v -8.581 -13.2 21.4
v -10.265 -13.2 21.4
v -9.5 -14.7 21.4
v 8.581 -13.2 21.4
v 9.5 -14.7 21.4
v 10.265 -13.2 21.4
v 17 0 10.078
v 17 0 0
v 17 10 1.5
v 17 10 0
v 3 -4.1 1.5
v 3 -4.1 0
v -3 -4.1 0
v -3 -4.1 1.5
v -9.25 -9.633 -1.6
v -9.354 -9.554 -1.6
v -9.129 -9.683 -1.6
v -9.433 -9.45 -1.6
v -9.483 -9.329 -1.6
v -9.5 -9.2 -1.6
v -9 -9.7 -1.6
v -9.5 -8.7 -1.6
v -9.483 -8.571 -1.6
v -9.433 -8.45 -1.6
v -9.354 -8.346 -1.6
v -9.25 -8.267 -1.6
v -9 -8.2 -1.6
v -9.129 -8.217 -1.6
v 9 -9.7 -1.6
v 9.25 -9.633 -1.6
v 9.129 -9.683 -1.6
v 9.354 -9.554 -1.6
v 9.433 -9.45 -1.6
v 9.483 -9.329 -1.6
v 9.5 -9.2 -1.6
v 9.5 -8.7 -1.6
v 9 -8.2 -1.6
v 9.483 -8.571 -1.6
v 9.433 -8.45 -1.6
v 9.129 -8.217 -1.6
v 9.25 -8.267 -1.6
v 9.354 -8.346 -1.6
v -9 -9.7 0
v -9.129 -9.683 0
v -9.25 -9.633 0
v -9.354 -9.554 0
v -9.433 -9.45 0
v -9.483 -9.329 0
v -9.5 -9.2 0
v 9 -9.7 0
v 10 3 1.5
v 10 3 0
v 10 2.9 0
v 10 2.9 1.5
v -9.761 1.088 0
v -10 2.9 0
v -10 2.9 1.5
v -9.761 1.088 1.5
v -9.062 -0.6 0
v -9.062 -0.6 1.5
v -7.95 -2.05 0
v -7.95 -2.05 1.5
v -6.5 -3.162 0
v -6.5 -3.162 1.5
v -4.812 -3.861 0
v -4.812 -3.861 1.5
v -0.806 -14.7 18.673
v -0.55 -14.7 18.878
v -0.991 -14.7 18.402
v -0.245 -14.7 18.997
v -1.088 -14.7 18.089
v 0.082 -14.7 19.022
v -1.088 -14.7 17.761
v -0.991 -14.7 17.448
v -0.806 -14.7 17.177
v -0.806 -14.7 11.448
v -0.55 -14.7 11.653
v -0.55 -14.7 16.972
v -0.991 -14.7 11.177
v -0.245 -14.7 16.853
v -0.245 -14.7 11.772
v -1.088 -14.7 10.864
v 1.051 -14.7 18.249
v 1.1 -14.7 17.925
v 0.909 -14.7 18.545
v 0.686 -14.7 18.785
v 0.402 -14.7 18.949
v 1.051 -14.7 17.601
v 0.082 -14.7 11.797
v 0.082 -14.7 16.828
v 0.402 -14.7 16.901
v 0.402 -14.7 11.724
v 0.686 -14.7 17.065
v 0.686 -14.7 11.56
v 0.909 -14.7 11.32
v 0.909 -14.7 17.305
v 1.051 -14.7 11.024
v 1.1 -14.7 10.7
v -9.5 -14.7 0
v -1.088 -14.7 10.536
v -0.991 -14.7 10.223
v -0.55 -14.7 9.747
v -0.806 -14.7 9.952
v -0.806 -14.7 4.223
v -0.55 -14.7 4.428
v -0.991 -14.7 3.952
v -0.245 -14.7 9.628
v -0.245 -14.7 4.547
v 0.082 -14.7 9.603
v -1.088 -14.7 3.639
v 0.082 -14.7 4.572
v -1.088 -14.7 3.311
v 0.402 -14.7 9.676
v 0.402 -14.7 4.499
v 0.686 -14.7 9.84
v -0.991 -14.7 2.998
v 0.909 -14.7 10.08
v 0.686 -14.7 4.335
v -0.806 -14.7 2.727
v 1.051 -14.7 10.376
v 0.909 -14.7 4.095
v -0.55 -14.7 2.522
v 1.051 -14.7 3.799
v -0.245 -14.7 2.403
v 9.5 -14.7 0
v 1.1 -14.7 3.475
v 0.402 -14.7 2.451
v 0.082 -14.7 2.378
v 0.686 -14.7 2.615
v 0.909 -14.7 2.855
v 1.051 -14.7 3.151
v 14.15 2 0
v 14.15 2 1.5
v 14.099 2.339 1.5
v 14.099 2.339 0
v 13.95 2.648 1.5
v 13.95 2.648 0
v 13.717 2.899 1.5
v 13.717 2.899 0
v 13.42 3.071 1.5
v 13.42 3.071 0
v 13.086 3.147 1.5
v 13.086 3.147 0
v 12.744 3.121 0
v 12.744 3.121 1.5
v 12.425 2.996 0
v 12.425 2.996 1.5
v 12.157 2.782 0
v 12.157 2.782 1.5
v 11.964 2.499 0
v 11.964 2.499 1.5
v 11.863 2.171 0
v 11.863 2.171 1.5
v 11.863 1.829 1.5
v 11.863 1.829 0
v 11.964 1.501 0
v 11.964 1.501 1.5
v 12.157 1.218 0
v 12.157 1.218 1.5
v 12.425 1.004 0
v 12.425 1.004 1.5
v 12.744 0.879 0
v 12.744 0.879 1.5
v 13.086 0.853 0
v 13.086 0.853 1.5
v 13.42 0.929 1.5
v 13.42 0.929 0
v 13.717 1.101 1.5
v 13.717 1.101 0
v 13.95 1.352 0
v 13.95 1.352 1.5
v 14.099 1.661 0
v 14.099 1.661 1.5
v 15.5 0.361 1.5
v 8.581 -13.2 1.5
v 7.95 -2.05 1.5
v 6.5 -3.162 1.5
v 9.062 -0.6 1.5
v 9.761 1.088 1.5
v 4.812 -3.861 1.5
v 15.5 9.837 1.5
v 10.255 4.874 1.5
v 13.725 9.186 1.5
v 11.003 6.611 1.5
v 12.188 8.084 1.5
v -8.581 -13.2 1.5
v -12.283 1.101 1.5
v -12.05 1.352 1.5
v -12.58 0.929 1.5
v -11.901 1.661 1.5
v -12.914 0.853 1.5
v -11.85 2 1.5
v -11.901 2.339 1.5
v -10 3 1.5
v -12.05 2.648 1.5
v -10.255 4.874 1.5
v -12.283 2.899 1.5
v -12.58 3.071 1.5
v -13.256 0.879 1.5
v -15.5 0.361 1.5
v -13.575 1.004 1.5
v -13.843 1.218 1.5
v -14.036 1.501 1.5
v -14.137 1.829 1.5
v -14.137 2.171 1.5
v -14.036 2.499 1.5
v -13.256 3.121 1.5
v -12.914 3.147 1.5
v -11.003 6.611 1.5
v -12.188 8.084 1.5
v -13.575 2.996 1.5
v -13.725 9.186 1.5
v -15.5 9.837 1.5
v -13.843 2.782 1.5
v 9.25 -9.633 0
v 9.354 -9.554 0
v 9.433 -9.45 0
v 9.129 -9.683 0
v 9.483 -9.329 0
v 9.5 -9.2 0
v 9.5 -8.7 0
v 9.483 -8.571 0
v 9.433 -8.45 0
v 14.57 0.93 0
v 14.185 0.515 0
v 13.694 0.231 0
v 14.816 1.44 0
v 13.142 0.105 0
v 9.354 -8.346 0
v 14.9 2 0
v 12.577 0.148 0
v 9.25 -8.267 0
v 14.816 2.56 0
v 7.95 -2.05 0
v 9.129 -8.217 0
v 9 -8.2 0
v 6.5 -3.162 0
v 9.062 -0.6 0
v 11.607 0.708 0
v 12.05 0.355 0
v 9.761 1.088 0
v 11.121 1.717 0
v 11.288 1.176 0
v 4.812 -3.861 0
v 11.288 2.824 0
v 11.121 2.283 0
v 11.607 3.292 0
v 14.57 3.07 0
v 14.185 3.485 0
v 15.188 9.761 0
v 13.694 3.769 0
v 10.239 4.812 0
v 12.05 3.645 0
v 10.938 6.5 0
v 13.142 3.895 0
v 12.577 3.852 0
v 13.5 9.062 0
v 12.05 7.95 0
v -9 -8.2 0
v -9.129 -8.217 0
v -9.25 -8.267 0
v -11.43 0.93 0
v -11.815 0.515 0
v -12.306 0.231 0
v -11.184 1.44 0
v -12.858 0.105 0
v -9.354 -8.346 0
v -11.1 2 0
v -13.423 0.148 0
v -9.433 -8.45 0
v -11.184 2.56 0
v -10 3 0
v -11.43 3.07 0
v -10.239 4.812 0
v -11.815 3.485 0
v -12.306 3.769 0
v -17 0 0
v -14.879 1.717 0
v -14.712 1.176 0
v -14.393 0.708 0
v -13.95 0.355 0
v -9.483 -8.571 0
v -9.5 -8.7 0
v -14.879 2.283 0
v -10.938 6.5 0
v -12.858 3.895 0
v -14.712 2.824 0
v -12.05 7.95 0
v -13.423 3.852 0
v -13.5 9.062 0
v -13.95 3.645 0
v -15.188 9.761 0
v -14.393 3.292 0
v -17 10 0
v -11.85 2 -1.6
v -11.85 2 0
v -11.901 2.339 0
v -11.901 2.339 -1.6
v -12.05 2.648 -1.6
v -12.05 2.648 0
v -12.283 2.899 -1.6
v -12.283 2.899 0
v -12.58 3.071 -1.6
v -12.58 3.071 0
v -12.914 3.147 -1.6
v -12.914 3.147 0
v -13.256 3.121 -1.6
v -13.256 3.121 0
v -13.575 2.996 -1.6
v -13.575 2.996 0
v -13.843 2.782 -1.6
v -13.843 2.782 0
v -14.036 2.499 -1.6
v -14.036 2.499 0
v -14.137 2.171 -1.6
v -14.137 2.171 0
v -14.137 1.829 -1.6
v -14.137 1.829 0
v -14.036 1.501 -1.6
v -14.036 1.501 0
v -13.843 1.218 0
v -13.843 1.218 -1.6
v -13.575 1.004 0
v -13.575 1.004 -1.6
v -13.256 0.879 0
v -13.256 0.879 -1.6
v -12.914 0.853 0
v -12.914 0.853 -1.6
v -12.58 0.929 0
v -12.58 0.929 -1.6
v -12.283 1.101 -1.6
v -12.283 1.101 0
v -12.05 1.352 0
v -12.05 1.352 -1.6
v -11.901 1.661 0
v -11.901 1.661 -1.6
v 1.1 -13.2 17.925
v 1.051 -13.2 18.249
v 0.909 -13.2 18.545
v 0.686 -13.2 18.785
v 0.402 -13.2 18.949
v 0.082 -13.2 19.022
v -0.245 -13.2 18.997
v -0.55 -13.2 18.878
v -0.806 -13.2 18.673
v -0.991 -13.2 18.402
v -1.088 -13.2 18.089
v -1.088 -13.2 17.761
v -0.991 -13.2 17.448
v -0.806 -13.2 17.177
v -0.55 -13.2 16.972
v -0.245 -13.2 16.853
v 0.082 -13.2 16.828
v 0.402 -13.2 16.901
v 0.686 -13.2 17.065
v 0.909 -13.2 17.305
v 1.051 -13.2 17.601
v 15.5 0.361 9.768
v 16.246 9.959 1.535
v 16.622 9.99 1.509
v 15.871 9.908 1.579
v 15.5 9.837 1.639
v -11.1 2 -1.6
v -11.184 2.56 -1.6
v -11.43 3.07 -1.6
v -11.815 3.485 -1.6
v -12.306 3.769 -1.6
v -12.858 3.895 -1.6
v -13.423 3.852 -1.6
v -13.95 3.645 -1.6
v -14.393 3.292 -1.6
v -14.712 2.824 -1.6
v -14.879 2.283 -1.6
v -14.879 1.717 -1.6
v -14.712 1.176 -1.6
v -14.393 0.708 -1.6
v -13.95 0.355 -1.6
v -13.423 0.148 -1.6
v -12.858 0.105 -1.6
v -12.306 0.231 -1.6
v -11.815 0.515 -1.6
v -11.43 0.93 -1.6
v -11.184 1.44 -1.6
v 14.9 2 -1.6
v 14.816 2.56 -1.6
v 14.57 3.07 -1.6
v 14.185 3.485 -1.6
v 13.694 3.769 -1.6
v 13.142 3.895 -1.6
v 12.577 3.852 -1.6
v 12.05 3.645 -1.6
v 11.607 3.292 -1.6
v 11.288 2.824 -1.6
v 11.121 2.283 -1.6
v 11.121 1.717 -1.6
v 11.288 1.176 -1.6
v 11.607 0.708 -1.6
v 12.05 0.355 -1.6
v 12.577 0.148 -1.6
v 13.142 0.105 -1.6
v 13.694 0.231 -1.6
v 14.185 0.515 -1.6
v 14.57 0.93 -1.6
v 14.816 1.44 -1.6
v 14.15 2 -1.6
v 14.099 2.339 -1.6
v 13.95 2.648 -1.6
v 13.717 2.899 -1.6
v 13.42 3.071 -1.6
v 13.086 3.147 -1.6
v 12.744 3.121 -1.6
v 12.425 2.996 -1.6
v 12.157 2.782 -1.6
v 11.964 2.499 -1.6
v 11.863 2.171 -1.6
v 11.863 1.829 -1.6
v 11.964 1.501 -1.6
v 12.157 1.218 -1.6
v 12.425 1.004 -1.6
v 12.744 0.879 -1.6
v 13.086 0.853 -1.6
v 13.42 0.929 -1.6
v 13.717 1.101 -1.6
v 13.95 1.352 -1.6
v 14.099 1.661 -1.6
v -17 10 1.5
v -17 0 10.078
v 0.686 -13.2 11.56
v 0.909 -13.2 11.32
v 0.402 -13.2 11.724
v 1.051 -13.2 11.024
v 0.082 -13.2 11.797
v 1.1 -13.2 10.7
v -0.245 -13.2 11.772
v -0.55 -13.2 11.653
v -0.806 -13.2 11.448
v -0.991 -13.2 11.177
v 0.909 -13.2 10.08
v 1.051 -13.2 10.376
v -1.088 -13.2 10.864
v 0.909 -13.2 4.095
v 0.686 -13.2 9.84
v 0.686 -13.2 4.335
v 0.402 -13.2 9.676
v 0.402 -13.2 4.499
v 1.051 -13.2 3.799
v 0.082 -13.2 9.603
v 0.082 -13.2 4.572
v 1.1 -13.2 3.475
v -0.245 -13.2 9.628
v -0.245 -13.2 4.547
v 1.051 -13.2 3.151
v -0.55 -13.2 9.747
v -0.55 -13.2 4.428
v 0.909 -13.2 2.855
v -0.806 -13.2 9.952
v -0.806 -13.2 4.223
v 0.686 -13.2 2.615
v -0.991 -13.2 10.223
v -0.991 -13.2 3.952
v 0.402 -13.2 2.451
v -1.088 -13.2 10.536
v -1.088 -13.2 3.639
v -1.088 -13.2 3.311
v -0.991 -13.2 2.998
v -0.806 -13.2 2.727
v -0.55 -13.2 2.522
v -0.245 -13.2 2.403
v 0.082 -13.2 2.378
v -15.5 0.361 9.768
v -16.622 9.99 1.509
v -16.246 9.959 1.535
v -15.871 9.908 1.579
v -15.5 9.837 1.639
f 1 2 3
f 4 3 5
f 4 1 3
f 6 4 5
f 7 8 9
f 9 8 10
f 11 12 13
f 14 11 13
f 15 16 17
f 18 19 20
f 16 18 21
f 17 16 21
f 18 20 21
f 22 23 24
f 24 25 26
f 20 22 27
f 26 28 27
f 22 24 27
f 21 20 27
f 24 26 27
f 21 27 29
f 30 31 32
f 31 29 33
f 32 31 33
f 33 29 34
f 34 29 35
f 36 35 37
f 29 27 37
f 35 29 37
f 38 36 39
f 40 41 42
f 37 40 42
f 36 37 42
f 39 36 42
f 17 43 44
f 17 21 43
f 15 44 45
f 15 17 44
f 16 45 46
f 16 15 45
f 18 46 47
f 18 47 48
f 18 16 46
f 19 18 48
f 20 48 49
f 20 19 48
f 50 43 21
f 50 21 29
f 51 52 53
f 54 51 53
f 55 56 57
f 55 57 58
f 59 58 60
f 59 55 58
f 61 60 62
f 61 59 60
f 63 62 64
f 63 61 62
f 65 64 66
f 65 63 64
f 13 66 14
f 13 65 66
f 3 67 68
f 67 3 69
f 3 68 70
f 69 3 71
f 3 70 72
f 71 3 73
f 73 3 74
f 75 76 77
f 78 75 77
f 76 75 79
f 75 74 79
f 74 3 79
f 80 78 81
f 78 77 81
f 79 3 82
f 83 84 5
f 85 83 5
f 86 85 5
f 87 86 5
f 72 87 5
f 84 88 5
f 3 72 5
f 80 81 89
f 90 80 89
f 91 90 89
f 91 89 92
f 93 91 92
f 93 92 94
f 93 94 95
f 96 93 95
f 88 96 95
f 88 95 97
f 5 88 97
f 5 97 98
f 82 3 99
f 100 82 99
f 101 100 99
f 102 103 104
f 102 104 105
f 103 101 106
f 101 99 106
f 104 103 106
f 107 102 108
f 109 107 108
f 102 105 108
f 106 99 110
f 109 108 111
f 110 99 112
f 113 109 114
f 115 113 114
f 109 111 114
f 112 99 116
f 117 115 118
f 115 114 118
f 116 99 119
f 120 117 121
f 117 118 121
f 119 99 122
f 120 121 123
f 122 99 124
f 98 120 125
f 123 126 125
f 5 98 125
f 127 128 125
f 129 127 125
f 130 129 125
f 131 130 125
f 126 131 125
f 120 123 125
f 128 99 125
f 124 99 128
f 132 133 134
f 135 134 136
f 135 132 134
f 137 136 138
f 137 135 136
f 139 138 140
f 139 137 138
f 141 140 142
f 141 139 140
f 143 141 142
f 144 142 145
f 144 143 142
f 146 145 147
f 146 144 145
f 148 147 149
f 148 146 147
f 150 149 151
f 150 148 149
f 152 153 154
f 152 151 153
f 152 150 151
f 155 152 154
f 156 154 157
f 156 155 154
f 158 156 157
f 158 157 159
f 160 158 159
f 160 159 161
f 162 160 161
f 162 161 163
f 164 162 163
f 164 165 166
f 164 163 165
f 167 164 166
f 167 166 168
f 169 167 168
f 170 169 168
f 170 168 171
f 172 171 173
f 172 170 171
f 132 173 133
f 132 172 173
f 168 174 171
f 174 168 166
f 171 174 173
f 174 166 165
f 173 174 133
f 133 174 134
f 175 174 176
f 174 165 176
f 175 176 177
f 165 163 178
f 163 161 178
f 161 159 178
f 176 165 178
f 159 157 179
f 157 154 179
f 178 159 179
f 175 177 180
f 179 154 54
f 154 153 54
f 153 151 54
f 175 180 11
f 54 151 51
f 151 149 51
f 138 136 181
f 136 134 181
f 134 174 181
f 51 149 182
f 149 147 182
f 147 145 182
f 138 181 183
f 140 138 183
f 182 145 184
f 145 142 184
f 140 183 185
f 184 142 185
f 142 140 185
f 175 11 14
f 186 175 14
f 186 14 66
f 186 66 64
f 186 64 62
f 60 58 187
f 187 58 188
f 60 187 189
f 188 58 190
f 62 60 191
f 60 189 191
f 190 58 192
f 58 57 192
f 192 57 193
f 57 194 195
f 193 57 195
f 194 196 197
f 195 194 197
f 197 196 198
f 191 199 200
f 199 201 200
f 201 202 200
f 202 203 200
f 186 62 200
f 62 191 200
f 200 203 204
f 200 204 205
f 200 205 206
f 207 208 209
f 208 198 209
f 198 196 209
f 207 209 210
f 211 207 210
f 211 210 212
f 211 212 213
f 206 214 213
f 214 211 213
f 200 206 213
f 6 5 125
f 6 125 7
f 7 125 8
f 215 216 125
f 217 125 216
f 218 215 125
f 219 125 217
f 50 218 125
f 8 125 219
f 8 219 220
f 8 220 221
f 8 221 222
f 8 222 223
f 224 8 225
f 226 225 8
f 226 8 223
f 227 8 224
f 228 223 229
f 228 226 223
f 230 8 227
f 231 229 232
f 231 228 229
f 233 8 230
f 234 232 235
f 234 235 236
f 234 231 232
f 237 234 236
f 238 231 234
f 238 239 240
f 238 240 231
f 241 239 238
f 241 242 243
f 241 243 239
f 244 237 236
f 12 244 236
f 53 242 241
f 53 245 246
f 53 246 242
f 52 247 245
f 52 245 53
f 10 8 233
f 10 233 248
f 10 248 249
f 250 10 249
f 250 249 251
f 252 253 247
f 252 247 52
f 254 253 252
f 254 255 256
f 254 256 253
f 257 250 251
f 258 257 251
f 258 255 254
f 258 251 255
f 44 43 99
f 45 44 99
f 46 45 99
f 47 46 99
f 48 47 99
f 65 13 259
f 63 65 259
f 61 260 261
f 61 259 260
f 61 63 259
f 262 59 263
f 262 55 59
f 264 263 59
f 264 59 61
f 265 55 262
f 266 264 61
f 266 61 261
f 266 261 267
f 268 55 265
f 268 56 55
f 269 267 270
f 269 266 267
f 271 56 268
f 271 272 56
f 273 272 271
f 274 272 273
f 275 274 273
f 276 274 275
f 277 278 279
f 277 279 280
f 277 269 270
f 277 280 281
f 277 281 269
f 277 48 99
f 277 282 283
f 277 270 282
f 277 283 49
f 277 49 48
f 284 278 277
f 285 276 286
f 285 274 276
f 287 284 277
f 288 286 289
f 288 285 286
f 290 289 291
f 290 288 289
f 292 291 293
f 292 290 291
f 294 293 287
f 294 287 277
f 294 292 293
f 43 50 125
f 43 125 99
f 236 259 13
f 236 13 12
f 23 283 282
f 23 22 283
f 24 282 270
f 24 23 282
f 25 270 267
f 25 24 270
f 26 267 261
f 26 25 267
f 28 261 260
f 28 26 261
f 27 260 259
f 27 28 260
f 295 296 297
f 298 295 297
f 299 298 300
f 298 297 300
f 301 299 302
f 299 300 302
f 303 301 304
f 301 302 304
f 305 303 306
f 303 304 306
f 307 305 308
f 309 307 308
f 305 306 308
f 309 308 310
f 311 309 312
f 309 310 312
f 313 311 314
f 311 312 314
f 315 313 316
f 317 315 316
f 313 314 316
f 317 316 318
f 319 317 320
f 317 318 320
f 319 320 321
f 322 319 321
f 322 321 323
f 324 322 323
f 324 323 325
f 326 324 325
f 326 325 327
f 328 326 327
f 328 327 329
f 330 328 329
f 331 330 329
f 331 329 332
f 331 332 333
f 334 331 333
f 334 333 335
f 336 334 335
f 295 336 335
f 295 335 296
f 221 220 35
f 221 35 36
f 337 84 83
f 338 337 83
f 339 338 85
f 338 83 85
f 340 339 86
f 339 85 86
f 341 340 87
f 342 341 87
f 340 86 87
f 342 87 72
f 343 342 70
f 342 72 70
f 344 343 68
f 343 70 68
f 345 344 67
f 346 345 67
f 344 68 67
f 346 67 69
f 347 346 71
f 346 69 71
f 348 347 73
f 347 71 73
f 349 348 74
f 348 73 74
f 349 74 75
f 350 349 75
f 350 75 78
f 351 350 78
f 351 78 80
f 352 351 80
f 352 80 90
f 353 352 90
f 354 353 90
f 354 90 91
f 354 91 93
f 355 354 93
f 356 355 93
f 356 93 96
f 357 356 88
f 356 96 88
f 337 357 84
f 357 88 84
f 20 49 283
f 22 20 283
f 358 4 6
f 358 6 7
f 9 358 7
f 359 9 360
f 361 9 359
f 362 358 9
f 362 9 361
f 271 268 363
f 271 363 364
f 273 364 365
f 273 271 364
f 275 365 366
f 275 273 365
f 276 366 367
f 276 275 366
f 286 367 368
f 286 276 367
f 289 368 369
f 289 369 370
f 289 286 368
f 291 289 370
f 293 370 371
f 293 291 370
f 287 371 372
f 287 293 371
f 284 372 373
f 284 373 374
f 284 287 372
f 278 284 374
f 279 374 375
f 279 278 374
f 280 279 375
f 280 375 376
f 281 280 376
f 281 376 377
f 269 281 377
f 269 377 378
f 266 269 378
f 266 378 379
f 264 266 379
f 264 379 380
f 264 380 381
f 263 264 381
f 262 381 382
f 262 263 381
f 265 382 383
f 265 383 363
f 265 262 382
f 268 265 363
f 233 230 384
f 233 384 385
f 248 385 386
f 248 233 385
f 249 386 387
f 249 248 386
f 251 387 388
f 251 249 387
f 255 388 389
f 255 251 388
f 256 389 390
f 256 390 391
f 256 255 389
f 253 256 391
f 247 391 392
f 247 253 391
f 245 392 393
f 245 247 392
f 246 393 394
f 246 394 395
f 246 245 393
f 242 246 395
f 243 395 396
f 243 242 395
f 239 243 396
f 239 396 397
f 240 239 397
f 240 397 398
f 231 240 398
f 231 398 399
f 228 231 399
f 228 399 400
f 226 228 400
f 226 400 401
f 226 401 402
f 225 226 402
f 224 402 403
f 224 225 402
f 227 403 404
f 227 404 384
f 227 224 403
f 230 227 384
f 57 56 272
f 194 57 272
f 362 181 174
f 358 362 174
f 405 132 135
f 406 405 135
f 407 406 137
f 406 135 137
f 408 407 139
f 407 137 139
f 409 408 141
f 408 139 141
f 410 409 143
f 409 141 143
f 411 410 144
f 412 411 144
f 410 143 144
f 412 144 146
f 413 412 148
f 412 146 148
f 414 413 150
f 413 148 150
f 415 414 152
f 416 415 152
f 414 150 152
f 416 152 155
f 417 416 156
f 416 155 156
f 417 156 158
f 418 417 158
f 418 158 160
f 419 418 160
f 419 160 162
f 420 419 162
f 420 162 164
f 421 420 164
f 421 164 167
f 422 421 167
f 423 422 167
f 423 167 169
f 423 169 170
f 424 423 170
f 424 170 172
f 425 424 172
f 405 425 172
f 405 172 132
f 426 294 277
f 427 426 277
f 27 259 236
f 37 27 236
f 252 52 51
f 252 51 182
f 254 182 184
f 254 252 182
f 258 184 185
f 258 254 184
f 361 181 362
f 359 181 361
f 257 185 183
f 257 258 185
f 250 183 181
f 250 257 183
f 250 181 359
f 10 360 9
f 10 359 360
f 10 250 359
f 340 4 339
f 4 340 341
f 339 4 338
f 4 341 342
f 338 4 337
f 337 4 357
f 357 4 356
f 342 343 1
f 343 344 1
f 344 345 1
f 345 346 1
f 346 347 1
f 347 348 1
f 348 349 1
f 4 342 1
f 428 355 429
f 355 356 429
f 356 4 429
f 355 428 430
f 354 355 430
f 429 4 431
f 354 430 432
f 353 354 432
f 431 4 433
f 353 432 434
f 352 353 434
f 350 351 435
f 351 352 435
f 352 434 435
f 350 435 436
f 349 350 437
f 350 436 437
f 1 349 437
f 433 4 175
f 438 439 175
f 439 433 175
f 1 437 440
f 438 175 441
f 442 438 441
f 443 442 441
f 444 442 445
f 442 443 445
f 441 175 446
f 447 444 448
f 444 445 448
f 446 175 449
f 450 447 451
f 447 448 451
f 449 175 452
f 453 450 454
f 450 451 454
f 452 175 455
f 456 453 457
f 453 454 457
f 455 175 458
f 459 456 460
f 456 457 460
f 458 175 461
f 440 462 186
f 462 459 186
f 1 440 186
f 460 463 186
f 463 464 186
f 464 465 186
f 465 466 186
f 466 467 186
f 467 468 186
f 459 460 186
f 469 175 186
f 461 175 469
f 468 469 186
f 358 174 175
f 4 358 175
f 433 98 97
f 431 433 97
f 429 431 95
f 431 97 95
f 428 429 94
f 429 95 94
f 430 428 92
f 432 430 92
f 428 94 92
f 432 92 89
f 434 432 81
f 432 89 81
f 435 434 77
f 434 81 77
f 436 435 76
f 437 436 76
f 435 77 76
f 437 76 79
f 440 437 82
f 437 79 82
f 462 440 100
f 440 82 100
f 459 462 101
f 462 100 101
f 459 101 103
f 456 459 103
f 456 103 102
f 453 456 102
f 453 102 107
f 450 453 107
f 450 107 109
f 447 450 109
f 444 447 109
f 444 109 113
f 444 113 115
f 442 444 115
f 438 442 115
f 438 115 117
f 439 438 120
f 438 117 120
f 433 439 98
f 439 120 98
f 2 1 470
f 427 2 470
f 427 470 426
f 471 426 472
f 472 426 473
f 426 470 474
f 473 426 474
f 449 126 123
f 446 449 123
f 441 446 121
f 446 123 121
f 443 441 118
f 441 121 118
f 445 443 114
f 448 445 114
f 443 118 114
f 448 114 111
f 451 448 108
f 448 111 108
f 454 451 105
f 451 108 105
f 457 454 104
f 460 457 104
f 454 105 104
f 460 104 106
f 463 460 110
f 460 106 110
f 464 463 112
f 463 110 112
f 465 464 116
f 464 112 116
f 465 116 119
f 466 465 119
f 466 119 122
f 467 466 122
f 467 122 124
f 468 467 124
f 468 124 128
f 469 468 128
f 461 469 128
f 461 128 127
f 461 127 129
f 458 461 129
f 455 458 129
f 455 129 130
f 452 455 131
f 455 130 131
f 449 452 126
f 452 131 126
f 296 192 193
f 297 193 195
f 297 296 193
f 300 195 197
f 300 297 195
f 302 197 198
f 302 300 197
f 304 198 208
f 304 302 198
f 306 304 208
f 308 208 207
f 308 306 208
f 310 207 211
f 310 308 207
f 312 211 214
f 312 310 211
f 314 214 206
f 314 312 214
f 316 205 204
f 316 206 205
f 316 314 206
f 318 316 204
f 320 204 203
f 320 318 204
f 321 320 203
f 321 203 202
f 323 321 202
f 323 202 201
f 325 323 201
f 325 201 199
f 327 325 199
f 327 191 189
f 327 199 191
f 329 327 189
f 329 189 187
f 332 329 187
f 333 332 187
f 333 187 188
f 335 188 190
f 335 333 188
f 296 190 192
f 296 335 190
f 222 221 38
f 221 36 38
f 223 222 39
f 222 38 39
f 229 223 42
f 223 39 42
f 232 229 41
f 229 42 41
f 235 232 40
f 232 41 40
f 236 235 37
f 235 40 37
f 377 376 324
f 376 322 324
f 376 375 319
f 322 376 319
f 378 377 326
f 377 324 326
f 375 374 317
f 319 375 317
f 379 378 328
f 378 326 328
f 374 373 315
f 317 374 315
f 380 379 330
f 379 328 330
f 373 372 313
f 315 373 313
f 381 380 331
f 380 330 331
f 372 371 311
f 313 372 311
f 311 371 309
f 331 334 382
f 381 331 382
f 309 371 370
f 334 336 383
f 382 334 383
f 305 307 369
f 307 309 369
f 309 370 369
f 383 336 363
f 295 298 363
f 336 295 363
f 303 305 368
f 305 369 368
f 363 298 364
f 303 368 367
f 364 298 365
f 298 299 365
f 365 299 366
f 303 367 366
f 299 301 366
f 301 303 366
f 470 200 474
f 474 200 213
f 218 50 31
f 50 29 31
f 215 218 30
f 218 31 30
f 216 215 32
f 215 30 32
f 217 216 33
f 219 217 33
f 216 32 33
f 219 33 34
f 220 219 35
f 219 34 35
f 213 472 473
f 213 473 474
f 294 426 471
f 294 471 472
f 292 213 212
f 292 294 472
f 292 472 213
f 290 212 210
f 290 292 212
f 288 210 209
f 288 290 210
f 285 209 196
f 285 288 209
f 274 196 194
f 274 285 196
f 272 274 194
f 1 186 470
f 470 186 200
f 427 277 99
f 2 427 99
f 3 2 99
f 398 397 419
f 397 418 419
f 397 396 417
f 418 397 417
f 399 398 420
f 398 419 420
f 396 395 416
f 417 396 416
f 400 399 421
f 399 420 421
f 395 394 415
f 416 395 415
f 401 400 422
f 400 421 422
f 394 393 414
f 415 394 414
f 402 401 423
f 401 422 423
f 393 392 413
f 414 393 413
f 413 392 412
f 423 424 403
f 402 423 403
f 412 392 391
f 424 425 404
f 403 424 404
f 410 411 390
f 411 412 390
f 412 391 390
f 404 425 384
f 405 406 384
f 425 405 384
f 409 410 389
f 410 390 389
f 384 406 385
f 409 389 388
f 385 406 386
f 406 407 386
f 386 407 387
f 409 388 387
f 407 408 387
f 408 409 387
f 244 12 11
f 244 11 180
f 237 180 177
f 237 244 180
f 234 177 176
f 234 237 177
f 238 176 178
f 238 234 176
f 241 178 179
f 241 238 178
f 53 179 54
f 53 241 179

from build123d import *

# Parameters (mm, degrees)
F4_DEPTH       = 21.4
F5_DEPTH       = 1.5
F1_R           = 1.9
F1_W           = 19
F1_H           = 1.5
F6_DEPTH       = 1.6
F8_DEPTH       = 17.001
F8_DEPTH_BACK  = 17.001
F9_R           = 1.15
F10_DEPTH      = 21.401
F10_DEPTH_BACK = 1.601
F11_R          = 1.1
F12_DEPTH      = 1.5
F13_T1_DEPTH   = 1.5
F13_T3_DEPTH   = 36.5
F14_R          = 0.5


# Not quite as in the source:
# - a fillet or chamfer that OpenCascade refuses, or shapes differently, is made with other operations: its cross-section is extruded or revolved along the edge and cut away or added


with BuildPart() as f4:
    # F3 (on face) → F4 (new body)
    with BuildSketch(Plane.XY):
        Polygon((-15.5, 10), (-17, 10), (-17, 0), (-9.5, -14.7), (0, -14.7), (9.5, -14.7), (17, 0), (17, 10), (15.5, 10), (15.5, 0.3605454095), (8.5813543829, -13.2), (0, -13.2), (-8.5813543829, -13.2), (-15.5, 0.3605454095), align=None)
    extrude(amount=F4_DEPTH)

    # F2 (on Top) → F5 (join)
    with BuildSketch(Plane.XY):
        Polygon((-17, 0), (-9.5, -14.7), (0, -14.7), (9.5, -14.7), (17, 0), (17, 10), (10, 10), (10, -4.1), (0, -4.1), (-10, -4.1), (-10, 10), (-17, 10), align=None)
    extrude(amount=F5_DEPTH)

    # F1 (on Top) → F6 (join)
    with BuildSketch(Plane.XY):
        with Locations((-13, 2)):
            Circle(F1_R)
        with Locations((13, 2)):
            Circle(F1_R)
        with Locations((0, -8.95)):
            Rectangle(F1_W, F1_H)
    extrude(amount=-F6_DEPTH)

    # F7 (on Right) → F8 (cut, two sides)
    with BuildSketch(Plane.YZ) as f8_sk:
        Polygon((-13.2, 21.4), (10, 1.5), (10, 21.4), align=None)
    extrude(amount=-F8_DEPTH, mode=Mode.SUBTRACT)
    extrude(f8_sk.sketch, amount=F8_DEPTH_BACK, mode=Mode.SUBTRACT)

    # F9 (on Top) → F10 (cut, two sides)
    with BuildSketch(Plane.XY) as f10_sk:
        with Locations((13, 2)):
            Circle(F9_R)
        with Locations((-13, 2)):
            Circle(F9_R)
    extrude(amount=F10_DEPTH, mode=Mode.SUBTRACT)
    extrude(f10_sk.sketch, amount=-F10_DEPTH_BACK, mode=Mode.SUBTRACT)

    # F11 (on face) → F12 (cut, through all)
    with BuildSketch(Plane.XZ.offset(14.7)):
        with Locations((0, 3.475)):
            Circle(F11_R)
        with Locations((0, 17.925)):
            Circle(F11_R)
        with Locations((0, 10.7)):
            Circle(F11_R)
    extrude(amount=-F12_DEPTH, mode=Mode.SUBTRACT)

    # F13: fillet of radius 7 on 4 edges, made by hand

    # F13_s2 → F13_t1 (join)
    with BuildSketch(Plane.XY):
        with BuildLine():
            ThreePointArc((3, -4.1), (7.9497474683, -2.0497474683), (10, 2.9))
            Line((10, 2.9), (10, -4.1))
            Line((10, -4.1), (3, -4.1))
        make_face()
        with BuildLine():
            ThreePointArc((-10, 2.9), (-7.9497474683, -2.0497474683), (-3, -4.1))
            Line((-3, -4.1), (-10, -4.1))
            Line((-10, -4.1), (-10, 2.9))
        make_face()
    extrude(amount=F13_T1_DEPTH)

    # F13_s4 → F13_t3 (cut)
    with BuildSketch(Plane.XY.offset(-17.5)):
        with BuildLine():
            ThreePointArc((-17, 10), (-12.0502525317, 7.9497474683), (-10, 3))
            Line((-10, 3), (-10, 10))
            Line((-10, 10), (-17, 10))
        make_face()
        with BuildLine():
            ThreePointArc((10, 3), (12.0502525317, 7.9497474683), (17, 10))
            Line((17, 10), (10, 10))
            Line((10, 10), (10, 3))
        make_face()
    extrude(amount=F13_T3_DEPTH, mode=Mode.SUBTRACT)

    # F14
    f14_edges = [f4.edges().sort_by_distance(p)[0] for p in [
        (-9.5, -8.2, -0.8),
        (-9.5, -9.7, -0.8),
        (9.5, -8.2, -0.8),
        (9.5, -9.7, -0.8),
    ]]
    fillet(f14_edges, radius=F14_R)


solid = f4.part
